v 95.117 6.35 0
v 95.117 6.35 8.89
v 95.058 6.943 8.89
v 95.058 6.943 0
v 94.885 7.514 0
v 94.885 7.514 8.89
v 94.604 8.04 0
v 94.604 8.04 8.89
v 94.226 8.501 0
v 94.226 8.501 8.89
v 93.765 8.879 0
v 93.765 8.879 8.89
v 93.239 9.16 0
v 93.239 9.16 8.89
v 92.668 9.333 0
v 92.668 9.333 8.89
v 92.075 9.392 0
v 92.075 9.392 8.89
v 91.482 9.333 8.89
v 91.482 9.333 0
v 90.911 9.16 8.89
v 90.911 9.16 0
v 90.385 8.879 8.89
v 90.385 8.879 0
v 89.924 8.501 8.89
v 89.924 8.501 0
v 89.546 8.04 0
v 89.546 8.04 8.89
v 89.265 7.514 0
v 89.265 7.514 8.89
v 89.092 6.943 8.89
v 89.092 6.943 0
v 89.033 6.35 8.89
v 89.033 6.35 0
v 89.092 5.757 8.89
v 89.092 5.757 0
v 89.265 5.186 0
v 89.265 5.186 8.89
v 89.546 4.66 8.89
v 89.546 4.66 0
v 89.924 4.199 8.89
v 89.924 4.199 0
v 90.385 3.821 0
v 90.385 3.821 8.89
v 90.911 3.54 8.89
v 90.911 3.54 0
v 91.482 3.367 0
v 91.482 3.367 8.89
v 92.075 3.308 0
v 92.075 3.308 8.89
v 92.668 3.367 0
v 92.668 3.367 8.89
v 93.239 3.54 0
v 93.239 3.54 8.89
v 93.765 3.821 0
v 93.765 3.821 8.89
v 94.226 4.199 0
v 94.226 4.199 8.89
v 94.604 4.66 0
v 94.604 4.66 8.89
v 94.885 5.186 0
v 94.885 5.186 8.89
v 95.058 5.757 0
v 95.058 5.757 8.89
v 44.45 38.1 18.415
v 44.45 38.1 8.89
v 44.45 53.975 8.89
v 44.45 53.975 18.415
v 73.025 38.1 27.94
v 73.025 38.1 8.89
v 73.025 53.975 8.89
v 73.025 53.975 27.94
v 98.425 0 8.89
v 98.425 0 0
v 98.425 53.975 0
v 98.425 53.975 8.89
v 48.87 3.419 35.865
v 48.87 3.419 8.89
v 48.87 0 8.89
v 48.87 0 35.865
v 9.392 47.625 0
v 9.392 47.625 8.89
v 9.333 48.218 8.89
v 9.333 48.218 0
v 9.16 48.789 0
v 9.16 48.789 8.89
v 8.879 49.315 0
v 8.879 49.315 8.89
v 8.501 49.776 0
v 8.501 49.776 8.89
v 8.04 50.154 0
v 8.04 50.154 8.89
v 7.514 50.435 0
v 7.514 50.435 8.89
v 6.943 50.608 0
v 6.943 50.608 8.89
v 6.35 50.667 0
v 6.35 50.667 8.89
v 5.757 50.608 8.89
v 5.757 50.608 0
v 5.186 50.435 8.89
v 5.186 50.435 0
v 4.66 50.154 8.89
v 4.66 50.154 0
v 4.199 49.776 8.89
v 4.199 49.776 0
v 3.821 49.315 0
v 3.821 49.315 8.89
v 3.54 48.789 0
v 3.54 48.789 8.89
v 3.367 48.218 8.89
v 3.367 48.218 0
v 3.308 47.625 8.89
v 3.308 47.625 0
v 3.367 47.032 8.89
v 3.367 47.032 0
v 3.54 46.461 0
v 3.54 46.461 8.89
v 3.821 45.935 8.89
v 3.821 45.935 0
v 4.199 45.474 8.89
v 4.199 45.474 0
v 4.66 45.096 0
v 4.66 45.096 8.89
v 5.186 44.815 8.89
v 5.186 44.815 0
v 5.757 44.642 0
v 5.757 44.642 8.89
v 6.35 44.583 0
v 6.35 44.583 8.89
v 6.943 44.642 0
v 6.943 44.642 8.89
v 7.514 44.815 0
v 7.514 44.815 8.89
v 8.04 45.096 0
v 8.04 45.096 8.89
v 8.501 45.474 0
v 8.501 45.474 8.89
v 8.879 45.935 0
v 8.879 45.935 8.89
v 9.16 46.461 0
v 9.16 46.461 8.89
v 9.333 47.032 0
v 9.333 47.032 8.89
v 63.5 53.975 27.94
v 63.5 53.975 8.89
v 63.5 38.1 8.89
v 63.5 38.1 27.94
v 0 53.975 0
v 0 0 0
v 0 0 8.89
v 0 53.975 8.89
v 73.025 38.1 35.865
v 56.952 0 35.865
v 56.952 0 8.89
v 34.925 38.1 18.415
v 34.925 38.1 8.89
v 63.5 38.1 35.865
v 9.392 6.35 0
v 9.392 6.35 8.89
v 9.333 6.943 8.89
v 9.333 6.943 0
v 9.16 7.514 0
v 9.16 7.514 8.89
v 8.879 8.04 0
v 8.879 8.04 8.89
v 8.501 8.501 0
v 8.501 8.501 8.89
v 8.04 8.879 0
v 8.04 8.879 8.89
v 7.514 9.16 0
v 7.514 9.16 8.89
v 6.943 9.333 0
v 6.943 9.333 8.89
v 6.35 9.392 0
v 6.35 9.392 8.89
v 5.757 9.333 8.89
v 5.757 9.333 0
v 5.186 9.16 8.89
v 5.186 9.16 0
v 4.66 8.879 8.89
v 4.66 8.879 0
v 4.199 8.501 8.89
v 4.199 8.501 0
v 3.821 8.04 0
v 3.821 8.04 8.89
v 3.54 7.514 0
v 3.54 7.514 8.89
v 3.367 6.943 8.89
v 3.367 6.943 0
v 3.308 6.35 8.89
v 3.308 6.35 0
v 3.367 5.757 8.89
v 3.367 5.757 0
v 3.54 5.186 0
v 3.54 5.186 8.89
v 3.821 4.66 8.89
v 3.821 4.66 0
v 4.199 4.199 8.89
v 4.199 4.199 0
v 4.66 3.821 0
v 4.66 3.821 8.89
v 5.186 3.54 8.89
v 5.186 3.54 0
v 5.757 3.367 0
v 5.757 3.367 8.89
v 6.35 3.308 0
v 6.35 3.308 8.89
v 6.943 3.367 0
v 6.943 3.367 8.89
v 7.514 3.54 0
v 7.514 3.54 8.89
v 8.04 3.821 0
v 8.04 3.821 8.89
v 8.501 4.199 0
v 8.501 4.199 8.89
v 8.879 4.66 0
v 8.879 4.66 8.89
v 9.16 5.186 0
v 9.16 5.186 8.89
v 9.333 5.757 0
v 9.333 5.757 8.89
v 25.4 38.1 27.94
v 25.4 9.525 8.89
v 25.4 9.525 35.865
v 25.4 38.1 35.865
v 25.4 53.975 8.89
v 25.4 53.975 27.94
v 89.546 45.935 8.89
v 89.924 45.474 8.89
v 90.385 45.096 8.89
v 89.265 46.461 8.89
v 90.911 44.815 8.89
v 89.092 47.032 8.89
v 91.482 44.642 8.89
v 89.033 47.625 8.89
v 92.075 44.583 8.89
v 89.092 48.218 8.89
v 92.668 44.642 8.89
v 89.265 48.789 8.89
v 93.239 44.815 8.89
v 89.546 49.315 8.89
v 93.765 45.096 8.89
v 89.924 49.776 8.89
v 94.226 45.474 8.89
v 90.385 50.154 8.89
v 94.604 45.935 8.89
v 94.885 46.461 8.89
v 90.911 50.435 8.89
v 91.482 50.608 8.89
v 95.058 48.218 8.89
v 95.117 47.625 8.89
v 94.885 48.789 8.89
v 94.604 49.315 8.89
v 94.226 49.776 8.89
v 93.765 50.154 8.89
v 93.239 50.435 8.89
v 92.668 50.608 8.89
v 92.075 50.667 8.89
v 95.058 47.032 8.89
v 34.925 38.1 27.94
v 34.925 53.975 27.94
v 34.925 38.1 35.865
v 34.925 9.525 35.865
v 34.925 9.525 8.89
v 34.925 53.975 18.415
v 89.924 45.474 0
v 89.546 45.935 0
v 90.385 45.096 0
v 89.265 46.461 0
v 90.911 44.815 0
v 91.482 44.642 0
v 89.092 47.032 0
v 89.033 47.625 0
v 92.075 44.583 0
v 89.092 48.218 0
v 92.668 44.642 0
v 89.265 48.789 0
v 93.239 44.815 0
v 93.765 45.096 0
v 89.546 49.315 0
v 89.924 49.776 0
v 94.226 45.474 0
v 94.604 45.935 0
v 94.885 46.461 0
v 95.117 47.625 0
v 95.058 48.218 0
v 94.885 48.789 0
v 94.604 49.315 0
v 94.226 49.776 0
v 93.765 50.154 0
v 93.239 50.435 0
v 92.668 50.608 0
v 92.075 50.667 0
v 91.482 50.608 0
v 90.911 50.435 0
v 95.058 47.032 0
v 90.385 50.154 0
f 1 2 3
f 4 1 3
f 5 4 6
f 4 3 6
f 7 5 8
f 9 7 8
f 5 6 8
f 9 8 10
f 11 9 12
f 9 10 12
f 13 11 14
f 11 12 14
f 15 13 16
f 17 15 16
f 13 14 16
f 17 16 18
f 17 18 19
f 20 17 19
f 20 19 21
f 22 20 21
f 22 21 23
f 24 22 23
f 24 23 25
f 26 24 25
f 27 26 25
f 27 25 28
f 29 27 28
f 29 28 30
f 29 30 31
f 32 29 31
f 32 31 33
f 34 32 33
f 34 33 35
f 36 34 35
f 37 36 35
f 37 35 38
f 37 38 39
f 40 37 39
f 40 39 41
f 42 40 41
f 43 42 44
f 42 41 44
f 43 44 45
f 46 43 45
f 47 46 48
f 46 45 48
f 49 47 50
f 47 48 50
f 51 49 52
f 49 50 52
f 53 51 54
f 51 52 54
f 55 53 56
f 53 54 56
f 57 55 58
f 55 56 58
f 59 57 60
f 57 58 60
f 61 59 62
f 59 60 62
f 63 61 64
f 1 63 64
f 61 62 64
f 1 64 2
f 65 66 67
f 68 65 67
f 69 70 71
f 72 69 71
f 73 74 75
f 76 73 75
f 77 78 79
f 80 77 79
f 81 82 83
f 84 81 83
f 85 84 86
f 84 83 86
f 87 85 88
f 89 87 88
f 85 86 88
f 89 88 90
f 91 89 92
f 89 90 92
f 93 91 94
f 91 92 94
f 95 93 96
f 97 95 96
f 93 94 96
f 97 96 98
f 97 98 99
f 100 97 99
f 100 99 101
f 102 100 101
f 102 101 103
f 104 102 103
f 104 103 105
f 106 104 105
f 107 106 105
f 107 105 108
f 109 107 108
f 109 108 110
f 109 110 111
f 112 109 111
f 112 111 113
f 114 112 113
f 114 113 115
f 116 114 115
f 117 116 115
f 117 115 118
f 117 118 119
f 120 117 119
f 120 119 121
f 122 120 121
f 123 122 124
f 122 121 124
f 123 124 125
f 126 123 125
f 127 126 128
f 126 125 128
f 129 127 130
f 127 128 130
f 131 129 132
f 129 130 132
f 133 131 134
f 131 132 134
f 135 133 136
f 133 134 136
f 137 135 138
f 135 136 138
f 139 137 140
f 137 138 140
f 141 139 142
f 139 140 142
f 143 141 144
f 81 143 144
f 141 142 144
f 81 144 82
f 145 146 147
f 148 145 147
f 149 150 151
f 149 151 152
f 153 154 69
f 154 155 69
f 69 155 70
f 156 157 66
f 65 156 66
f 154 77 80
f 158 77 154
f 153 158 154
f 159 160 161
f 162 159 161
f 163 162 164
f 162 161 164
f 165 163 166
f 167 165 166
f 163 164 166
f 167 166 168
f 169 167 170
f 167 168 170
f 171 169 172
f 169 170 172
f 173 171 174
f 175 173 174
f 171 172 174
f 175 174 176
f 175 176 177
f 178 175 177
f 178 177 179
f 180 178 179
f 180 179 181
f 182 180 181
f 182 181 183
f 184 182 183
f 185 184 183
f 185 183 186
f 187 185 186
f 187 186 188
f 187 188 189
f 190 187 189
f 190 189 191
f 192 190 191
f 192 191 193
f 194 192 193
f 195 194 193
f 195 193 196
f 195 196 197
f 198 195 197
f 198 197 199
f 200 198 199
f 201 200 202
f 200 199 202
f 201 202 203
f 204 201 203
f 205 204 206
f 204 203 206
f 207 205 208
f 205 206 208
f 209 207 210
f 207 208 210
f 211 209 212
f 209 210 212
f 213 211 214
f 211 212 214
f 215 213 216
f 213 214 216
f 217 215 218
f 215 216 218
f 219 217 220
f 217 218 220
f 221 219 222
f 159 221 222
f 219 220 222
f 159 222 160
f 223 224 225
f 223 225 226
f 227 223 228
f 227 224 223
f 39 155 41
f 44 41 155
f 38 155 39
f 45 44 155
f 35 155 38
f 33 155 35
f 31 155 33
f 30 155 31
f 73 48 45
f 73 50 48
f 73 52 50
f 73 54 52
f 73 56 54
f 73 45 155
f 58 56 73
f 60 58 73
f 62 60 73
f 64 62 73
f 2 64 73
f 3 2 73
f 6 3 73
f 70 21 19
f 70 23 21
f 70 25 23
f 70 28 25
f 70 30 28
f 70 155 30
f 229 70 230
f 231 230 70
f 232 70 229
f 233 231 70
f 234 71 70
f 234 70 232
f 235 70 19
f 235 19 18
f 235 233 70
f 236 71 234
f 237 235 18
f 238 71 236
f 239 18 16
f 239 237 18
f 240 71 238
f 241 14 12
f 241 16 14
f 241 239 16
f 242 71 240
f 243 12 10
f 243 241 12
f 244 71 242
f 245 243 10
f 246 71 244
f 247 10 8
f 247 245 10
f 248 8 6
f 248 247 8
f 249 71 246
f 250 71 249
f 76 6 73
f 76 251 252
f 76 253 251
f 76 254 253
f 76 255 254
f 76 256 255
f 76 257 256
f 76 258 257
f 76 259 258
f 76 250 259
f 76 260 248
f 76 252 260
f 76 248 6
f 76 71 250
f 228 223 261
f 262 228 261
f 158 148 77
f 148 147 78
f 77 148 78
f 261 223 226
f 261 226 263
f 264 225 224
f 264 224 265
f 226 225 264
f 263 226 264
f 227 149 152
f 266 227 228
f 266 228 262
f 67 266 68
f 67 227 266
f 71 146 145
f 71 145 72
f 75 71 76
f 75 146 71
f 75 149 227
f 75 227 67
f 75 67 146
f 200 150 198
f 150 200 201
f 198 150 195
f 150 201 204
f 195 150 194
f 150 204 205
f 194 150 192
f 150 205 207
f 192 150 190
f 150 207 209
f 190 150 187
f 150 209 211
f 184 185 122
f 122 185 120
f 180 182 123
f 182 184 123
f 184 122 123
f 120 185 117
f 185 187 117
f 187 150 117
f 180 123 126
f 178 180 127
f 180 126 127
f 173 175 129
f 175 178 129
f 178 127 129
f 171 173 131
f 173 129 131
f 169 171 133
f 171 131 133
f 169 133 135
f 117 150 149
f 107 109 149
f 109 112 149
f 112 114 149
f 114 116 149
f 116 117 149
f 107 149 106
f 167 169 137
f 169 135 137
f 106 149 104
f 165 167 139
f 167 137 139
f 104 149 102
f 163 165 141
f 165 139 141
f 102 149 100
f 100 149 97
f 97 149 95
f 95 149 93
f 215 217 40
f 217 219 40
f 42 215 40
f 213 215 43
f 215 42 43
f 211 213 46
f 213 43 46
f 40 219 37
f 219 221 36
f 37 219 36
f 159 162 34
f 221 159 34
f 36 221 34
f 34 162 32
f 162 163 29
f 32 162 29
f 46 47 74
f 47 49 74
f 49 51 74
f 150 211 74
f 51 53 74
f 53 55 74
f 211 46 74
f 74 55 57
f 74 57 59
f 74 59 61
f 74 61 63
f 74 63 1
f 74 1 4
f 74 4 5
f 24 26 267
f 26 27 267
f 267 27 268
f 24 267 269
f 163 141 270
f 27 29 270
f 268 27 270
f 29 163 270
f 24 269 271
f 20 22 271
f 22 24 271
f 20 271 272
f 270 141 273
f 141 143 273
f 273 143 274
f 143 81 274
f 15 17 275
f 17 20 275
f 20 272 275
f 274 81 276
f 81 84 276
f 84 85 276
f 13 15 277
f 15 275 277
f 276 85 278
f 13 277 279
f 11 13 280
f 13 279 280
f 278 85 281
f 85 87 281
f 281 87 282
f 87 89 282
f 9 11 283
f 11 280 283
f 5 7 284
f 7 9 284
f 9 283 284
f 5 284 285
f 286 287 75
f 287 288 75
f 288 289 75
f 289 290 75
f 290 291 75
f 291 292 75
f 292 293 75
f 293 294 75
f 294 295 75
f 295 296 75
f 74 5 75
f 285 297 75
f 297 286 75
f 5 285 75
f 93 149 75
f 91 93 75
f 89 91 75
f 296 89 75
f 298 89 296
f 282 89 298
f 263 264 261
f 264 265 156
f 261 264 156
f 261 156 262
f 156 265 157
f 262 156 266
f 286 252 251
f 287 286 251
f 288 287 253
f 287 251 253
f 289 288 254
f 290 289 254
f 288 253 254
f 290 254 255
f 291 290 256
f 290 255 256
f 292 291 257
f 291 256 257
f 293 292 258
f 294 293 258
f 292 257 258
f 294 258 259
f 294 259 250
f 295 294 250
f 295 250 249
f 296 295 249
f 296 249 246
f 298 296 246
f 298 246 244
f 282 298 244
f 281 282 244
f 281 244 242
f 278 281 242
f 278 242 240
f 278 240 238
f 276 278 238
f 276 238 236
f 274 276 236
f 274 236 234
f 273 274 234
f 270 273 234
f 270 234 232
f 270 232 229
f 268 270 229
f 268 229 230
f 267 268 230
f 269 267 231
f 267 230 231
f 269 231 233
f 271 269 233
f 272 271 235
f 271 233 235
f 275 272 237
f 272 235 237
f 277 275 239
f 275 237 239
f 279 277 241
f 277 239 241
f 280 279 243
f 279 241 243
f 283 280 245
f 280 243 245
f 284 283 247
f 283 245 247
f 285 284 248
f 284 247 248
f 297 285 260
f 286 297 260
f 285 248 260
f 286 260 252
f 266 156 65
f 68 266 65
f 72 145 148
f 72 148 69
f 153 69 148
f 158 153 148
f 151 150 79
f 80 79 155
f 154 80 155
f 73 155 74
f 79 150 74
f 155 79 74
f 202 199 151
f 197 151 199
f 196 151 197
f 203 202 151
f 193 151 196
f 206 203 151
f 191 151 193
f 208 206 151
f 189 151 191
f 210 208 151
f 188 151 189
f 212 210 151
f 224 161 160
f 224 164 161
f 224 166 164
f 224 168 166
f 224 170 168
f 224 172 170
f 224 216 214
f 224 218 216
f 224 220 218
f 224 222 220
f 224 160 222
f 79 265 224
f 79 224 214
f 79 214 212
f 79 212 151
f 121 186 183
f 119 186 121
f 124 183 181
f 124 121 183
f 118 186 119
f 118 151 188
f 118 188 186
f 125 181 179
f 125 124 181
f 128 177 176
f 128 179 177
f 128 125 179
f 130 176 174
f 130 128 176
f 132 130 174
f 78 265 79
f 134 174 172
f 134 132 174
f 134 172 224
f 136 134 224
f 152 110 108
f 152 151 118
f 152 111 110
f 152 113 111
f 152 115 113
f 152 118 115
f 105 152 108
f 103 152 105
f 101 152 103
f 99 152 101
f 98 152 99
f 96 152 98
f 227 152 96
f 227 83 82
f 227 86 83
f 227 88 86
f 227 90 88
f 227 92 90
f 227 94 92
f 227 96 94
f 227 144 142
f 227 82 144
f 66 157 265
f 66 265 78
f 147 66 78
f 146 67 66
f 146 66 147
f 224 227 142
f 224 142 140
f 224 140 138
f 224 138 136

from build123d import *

# Parameters (mm, degrees)
F0_W      = 98.425
F0_H      = 53.975
F1_DEPTH  = 8.89
F3_DEPTH  = 9.525
F5_DEPTH  = 19.05
F7_DEPTH  = 7.9248
F8_W      = 9.525
F8_H      = 53.975
F9_DEPTH  = 9.525
F10_W     = 9.525
F10_H     = 38.1
F11_DEPTH = 7.9248
F12_R     = 3.041543
F13_DEPTH = 25.4
F14_W     = 9.525
F14_H     = 9.525
F15_DEPTH = 26.9748


with BuildPart() as f1:
    # F0 (on Top) → F1 (new body)
    with BuildSketch(Plane.XY):
        with Locations((49.2125, 26.9875)):
            Rectangle(F0_W, F0_H)
    extrude(amount=F1_DEPTH)

    # F2 (on face) → F3 (join)
    with BuildSketch(Plane.XY.offset(8.89)):
        Polygon((25.4, 0), (34.925, 0), (34.925, 38.1), (44.45, 38.1), (44.45, 53.975), (25.4, 53.975), align=None)
    extrude(amount=F3_DEPTH)

    # F4 (on face) → F5 (join)
    with BuildSketch(Plane.XY.offset(8.89)):
        Polygon((73.025, 53.975), (63.5, 53.975), (63.5, 38.1), (48.8696, 3.41884), (48.8696, 0), (56.952347, 0), (73.025, 38.1), align=None)
    extrude(amount=F5_DEPTH)

    # F6 (on face) → F7 (join)
    with BuildSketch(Plane.XY.offset(27.94)):
        Polygon((48.8696, 0), (56.952347, 0), (73.025, 38.1), (63.5, 38.1), (48.8696, 3.41884), align=None)
    extrude(amount=F7_DEPTH)

    # F8 (on face) → F9 (join)
    with BuildSketch(Plane.XY.offset(18.415)):
        with Locations((30.1625, 26.9875)):
            Rectangle(F8_W, F8_H)
    extrude(amount=F9_DEPTH)

    # F10 (on face) → F11 (join)
    with BuildSketch(Plane.XY.offset(27.94)):
        with Locations((30.1625, 19.05)):
            Rectangle(F10_W, F10_H)
    extrude(amount=F11_DEPTH)

    # F12 (on face) → F13 (cut)
    with BuildSketch(Plane.XY.offset(8.89)):
        with Locations((6.35, 47.625)):
            Circle(F12_R)
        with Locations((6.35, 6.35)):
            Circle(F12_R)
        with Locations((92.075, 6.35)):
            Circle(F12_R)
        with Locations((92.075, 47.625)):
            Circle(F12_R)
    extrude(amount=-F13_DEPTH, mode=Mode.SUBTRACT)

    # F14 (on face) → F15 (cut, through all)
    with BuildSketch(Plane.XY.offset(35.8648)):
        with Locations((30.1625, 4.7625)):
            Rectangle(F14_W, F14_H)
    extrude(amount=-F15_DEPTH, mode=Mode.SUBTRACT)


solid = f1.part
